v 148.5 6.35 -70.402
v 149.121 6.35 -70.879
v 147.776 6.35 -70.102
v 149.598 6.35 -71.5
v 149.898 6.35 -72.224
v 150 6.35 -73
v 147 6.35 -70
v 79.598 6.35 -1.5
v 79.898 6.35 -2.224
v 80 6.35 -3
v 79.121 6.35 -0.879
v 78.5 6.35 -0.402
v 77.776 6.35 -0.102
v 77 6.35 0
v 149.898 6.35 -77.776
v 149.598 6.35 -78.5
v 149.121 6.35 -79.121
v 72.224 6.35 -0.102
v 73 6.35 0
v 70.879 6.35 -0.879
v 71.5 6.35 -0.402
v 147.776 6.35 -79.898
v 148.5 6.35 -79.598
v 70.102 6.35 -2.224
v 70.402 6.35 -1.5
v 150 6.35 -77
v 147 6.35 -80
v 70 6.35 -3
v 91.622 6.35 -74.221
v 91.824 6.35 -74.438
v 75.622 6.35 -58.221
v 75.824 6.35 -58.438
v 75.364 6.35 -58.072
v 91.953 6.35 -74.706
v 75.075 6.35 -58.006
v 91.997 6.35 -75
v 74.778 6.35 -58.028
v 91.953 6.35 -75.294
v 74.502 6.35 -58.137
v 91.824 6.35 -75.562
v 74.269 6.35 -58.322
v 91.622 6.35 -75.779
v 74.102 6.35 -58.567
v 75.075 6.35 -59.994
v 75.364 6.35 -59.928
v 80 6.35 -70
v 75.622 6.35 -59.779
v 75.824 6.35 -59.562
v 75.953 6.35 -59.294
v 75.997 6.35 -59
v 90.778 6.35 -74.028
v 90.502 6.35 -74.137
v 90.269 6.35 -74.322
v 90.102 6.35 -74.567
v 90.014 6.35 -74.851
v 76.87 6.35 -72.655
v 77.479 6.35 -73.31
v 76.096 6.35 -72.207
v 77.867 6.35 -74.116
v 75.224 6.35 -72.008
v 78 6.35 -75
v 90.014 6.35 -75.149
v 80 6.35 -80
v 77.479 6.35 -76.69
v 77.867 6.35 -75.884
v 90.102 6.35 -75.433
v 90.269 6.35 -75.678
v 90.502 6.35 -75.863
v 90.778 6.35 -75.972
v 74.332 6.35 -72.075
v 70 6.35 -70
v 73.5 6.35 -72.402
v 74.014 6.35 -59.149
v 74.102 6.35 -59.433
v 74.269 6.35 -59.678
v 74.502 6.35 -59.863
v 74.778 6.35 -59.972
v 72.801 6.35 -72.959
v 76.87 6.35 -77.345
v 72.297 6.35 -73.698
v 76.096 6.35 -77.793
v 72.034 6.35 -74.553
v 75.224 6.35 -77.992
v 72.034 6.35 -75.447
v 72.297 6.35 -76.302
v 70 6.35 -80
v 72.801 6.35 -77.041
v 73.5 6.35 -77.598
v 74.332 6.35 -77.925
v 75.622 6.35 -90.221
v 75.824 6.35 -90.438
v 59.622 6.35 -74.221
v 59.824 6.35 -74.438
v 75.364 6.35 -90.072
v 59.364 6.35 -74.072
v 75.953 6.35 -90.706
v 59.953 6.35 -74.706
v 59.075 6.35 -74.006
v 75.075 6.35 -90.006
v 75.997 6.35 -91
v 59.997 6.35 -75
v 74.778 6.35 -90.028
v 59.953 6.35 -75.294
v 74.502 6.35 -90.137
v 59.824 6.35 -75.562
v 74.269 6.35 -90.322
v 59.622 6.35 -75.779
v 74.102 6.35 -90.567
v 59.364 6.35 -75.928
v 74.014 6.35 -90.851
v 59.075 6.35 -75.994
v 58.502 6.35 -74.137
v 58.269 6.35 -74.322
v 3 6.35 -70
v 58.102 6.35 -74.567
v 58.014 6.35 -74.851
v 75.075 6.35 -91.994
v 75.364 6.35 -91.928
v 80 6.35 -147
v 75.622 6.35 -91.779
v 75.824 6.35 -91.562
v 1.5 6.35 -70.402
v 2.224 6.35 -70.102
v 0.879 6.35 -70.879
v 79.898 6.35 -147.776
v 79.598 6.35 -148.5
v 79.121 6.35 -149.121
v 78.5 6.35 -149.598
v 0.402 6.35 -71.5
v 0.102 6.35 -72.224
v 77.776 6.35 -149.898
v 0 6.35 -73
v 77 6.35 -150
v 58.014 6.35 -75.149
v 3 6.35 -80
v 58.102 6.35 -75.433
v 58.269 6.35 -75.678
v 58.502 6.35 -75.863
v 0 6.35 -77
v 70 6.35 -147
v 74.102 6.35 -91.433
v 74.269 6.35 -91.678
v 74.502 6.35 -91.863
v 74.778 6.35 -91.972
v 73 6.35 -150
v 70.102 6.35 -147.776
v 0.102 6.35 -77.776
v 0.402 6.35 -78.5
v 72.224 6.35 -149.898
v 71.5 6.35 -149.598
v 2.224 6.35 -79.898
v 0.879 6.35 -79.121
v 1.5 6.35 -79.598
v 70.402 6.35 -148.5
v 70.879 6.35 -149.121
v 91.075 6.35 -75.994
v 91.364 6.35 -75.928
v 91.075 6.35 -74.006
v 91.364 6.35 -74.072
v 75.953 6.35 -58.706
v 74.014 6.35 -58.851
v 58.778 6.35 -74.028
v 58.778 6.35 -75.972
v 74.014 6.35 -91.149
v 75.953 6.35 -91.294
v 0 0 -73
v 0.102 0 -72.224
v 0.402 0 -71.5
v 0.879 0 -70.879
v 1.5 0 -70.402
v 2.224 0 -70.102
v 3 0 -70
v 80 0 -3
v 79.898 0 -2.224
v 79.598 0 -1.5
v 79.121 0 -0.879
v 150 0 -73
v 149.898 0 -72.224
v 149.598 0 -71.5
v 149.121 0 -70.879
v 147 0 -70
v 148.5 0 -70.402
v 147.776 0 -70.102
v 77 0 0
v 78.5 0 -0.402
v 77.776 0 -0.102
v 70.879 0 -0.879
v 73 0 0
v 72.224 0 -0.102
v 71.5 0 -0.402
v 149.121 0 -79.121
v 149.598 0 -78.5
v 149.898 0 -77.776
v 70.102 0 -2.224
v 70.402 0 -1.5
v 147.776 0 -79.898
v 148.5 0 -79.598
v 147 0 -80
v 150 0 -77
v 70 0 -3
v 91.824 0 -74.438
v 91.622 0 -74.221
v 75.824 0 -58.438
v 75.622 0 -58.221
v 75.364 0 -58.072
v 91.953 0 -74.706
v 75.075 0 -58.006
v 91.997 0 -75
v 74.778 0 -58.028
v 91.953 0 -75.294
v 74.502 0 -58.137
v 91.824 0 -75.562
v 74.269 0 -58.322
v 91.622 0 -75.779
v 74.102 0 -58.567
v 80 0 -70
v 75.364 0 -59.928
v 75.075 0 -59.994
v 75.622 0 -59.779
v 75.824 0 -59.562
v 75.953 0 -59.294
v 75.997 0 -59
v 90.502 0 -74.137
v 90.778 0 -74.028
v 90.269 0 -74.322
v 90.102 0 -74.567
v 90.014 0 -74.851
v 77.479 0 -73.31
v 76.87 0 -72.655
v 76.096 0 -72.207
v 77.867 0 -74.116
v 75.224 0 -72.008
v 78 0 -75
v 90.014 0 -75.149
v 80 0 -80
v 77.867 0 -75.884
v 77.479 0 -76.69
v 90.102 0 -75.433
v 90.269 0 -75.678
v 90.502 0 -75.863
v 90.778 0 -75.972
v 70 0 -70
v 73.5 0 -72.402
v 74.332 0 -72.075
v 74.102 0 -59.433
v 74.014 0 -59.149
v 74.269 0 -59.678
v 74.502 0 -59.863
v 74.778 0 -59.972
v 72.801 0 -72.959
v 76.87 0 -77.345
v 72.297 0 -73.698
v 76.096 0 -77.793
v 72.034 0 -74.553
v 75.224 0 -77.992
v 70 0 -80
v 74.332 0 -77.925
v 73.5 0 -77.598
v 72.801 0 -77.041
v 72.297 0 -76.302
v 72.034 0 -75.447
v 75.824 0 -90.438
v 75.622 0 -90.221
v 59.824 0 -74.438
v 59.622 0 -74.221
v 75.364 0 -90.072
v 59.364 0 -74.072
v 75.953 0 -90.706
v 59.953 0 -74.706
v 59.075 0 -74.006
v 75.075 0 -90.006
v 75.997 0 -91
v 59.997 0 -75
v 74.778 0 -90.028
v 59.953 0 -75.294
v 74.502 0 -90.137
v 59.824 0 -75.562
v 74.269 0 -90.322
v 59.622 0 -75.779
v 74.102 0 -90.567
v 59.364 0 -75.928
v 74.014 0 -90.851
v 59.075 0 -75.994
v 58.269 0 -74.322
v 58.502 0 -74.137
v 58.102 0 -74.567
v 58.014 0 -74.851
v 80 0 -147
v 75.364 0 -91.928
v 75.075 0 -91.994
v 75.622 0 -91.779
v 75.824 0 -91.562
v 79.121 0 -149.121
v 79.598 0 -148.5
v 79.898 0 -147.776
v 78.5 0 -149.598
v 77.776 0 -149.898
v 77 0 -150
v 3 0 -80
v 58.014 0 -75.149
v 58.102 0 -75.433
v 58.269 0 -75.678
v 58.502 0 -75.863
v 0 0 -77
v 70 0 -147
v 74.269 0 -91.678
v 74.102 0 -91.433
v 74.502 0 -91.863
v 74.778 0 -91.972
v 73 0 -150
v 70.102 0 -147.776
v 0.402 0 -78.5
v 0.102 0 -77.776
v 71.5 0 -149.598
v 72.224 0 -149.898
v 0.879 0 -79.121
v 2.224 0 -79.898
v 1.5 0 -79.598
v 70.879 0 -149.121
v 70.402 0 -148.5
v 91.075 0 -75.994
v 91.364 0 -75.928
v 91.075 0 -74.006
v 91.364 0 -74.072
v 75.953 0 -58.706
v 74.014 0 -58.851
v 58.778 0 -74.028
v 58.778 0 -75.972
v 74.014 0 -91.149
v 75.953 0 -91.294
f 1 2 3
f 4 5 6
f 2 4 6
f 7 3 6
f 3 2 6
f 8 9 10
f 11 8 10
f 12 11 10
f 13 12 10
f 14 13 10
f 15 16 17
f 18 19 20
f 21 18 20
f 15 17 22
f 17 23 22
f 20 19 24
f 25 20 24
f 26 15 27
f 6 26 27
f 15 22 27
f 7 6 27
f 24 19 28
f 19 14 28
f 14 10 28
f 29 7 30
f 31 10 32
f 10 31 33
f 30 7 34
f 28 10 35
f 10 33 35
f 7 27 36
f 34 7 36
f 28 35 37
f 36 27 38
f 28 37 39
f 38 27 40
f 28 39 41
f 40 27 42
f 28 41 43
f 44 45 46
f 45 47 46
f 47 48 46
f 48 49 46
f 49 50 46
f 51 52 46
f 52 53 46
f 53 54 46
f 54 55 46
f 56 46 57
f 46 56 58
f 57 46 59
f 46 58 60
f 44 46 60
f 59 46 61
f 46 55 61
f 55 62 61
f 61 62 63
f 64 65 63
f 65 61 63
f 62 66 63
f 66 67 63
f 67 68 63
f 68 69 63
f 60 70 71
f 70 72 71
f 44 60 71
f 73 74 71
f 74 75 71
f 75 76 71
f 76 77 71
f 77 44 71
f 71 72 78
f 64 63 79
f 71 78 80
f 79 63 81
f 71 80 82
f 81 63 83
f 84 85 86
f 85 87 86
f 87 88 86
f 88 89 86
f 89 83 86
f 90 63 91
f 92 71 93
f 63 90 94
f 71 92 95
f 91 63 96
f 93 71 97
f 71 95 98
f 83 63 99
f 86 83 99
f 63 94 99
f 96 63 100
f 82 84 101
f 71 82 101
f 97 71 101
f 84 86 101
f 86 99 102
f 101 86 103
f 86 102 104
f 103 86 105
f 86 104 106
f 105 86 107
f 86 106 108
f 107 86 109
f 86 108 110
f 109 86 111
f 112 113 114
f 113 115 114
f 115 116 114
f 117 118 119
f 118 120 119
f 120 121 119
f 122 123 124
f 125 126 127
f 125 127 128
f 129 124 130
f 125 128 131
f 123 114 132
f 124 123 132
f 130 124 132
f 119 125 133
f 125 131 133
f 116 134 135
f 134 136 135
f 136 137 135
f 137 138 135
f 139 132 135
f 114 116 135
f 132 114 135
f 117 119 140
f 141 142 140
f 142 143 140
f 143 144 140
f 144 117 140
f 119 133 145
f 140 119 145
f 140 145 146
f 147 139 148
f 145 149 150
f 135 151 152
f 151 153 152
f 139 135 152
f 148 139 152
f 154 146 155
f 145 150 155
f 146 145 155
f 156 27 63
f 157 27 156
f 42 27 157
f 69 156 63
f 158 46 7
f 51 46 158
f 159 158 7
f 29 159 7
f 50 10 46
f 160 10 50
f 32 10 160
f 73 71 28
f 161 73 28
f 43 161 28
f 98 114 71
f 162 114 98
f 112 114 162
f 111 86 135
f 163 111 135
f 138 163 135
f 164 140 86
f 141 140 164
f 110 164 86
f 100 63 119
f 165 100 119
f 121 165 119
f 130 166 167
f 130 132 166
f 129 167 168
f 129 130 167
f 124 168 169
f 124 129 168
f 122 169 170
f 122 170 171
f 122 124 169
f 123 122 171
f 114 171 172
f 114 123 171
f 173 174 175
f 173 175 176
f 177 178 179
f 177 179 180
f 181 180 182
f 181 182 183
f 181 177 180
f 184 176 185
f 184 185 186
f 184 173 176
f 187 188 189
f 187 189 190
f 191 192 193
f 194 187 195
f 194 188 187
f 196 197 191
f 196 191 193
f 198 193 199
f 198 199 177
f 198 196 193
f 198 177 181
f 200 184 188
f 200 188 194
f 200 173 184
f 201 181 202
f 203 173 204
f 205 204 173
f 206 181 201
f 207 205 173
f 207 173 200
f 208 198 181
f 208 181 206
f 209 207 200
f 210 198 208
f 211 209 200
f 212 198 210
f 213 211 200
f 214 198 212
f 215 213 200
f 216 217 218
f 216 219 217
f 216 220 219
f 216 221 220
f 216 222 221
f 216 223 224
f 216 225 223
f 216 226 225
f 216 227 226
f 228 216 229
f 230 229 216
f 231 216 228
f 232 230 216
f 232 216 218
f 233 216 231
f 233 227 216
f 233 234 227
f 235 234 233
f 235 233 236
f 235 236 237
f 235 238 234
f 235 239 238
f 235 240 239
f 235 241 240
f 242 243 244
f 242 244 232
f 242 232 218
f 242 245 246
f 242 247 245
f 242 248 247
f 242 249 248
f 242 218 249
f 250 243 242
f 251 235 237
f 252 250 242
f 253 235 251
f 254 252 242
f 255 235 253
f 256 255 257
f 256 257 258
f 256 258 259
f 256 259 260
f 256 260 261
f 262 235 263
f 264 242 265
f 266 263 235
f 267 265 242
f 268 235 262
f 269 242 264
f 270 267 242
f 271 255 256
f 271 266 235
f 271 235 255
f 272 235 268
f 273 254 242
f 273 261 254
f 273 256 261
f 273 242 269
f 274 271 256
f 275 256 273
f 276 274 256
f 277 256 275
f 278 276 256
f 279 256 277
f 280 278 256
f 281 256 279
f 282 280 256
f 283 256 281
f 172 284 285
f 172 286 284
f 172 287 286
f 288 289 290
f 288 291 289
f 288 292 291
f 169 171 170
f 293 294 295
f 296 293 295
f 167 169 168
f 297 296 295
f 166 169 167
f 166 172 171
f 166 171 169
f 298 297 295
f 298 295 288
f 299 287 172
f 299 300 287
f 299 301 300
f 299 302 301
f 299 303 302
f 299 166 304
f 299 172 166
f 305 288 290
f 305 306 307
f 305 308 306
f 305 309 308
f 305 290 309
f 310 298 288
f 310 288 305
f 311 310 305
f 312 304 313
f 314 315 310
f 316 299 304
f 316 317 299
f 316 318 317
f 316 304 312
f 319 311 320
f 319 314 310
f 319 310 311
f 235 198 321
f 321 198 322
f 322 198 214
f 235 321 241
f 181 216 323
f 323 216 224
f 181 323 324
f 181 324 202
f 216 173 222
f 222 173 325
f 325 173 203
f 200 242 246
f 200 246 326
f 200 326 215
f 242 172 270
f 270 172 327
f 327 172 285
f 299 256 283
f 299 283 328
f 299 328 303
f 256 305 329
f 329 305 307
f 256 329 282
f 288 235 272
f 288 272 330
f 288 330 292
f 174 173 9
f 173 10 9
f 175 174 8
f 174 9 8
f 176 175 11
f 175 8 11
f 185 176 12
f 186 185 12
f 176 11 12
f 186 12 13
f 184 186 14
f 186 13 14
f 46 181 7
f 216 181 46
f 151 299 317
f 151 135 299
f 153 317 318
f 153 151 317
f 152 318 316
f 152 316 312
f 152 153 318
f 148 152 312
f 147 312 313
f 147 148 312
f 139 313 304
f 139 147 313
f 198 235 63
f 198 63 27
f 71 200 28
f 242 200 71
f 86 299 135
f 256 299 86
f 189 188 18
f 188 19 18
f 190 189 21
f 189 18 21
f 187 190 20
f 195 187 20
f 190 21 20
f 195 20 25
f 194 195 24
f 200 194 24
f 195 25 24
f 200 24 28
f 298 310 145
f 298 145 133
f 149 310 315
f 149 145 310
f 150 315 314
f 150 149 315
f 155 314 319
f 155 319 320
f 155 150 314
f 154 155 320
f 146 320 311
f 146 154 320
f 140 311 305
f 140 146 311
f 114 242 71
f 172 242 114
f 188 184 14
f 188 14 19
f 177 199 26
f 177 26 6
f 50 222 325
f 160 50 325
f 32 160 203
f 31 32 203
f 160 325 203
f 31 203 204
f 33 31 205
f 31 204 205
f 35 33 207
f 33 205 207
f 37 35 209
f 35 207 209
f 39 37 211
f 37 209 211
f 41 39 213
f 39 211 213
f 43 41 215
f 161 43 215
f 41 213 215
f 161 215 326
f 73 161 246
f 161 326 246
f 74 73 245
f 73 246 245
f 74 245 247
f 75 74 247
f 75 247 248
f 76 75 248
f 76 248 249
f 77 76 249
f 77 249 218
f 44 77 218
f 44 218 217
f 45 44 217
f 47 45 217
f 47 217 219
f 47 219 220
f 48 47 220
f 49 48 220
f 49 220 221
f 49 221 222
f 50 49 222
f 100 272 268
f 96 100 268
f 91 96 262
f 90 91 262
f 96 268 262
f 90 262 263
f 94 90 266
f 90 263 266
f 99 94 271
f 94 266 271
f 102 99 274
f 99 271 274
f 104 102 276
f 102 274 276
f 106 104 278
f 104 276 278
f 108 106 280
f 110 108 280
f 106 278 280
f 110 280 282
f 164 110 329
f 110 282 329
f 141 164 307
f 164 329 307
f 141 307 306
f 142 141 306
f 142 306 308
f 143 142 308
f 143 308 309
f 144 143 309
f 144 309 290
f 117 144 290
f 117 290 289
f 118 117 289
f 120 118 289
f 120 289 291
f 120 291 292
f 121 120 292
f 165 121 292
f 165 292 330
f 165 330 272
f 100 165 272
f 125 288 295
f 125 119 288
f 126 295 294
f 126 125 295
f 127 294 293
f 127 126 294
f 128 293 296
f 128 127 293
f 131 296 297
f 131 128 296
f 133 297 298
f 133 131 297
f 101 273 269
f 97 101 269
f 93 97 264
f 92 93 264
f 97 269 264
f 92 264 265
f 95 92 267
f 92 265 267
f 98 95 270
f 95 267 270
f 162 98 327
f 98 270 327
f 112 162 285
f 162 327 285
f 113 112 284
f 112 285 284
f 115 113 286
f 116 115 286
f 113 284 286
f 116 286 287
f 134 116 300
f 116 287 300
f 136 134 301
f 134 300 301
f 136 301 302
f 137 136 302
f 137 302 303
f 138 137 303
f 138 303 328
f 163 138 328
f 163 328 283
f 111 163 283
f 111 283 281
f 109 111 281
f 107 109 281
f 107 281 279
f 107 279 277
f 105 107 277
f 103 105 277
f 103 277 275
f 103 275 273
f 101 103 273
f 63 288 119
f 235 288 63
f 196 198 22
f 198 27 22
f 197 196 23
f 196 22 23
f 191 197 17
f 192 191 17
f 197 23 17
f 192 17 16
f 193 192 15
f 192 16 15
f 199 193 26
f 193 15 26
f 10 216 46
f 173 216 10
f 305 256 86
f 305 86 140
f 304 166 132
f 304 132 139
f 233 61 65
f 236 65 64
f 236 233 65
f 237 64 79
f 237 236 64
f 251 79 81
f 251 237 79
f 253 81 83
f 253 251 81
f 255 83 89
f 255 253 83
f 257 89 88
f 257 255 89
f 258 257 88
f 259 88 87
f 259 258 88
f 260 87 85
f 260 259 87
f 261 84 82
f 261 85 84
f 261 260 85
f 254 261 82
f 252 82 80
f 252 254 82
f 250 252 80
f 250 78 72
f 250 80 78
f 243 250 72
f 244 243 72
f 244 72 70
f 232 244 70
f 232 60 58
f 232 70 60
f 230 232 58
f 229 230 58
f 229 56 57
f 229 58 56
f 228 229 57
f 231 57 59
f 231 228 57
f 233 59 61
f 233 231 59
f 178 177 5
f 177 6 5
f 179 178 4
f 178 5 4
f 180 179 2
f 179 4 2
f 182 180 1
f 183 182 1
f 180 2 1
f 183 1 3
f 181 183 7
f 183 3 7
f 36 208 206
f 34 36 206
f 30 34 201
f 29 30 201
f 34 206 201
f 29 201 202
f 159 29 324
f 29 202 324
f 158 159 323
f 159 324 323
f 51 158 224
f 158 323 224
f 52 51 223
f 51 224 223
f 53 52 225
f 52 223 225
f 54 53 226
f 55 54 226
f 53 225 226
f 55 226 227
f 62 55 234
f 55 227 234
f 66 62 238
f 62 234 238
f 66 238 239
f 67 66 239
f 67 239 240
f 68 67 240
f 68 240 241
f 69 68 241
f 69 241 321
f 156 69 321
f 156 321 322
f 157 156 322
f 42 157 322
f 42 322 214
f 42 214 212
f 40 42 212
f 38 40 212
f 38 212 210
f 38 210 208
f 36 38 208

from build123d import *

# Parameters (mm, degrees)
MAIN_SHAPE_DEPTH                = 6.35
BASE_X_HOLES_D                  = 1.9939
BASE_X_HOLES_DEPTH              = 7.67
BASE_X_HOLES_TIP                = 0.599027994
FILLET1_R                       = 3
SKETCH5_R                       = 3
CUTOUT_FOR_MOUNTING_SCREW_DEPTH = 7.35


with BuildPart() as part:
    # Sketch1 → main shape (new body)
    with BuildSketch(Plane(origin=(0, 0, 0), x_dir=(1, 0, 0), z_dir=(0, 1, 0))):
        Polygon((80, 80), (150, 80), (150, 70), (80, 70), (80, 0), (70, 0), (70, 70), (0, 70), (0, 80), (70, 80), (70, 150), (80, 150), align=None)
    extrude(amount=MAIN_SHAPE_DEPTH)

    # base X holes
    with Locations(Plane(origin=(0, 6.35, 0), x_dir=(-1, 0, 0), z_dir=(0, 1, 0))):
        with Locations((-75, -91), (-59, -75), (-75, -59), (-91, -75)):
            Hole(BASE_X_HOLES_D / 2, depth=BASE_X_HOLES_DEPTH)
            with Locations((0, 0, -(BASE_X_HOLES_DEPTH + BASE_X_HOLES_TIP / 2))):  # 118° drill point
                Cone(0, BASE_X_HOLES_D / 2, BASE_X_HOLES_TIP, mode=Mode.SUBTRACT)

    # Fillet1
    fillet1_edges = [part.edges().sort_by_distance(p)[0] for p in [
        (0, 3.175, -80),
        (70, 3.175, -150),
        (80, 3.175, -150),
        (150, 3.175, -80),
        (150, 3.175, -70),
        (80, 3.175, 0),
        (70, 3.175, 0),
        (0, 3.175, -70),
    ]]
    fillet(fillet1_edges, radius=FILLET1_R)

    # Sketch5 → cutout for mounting screw (cut, through all)
    with BuildSketch(Plane(origin=(0, 0, 0), x_dir=(1, 0, 0), z_dir=(0, 1, 0))):
        with Locations((75, 75)):
            Circle(SKETCH5_R)
    extrude(amount=CUTOUT_FOR_MOUNTING_SCREW_DEPTH, mode=Mode.SUBTRACT)


solid = part.part
